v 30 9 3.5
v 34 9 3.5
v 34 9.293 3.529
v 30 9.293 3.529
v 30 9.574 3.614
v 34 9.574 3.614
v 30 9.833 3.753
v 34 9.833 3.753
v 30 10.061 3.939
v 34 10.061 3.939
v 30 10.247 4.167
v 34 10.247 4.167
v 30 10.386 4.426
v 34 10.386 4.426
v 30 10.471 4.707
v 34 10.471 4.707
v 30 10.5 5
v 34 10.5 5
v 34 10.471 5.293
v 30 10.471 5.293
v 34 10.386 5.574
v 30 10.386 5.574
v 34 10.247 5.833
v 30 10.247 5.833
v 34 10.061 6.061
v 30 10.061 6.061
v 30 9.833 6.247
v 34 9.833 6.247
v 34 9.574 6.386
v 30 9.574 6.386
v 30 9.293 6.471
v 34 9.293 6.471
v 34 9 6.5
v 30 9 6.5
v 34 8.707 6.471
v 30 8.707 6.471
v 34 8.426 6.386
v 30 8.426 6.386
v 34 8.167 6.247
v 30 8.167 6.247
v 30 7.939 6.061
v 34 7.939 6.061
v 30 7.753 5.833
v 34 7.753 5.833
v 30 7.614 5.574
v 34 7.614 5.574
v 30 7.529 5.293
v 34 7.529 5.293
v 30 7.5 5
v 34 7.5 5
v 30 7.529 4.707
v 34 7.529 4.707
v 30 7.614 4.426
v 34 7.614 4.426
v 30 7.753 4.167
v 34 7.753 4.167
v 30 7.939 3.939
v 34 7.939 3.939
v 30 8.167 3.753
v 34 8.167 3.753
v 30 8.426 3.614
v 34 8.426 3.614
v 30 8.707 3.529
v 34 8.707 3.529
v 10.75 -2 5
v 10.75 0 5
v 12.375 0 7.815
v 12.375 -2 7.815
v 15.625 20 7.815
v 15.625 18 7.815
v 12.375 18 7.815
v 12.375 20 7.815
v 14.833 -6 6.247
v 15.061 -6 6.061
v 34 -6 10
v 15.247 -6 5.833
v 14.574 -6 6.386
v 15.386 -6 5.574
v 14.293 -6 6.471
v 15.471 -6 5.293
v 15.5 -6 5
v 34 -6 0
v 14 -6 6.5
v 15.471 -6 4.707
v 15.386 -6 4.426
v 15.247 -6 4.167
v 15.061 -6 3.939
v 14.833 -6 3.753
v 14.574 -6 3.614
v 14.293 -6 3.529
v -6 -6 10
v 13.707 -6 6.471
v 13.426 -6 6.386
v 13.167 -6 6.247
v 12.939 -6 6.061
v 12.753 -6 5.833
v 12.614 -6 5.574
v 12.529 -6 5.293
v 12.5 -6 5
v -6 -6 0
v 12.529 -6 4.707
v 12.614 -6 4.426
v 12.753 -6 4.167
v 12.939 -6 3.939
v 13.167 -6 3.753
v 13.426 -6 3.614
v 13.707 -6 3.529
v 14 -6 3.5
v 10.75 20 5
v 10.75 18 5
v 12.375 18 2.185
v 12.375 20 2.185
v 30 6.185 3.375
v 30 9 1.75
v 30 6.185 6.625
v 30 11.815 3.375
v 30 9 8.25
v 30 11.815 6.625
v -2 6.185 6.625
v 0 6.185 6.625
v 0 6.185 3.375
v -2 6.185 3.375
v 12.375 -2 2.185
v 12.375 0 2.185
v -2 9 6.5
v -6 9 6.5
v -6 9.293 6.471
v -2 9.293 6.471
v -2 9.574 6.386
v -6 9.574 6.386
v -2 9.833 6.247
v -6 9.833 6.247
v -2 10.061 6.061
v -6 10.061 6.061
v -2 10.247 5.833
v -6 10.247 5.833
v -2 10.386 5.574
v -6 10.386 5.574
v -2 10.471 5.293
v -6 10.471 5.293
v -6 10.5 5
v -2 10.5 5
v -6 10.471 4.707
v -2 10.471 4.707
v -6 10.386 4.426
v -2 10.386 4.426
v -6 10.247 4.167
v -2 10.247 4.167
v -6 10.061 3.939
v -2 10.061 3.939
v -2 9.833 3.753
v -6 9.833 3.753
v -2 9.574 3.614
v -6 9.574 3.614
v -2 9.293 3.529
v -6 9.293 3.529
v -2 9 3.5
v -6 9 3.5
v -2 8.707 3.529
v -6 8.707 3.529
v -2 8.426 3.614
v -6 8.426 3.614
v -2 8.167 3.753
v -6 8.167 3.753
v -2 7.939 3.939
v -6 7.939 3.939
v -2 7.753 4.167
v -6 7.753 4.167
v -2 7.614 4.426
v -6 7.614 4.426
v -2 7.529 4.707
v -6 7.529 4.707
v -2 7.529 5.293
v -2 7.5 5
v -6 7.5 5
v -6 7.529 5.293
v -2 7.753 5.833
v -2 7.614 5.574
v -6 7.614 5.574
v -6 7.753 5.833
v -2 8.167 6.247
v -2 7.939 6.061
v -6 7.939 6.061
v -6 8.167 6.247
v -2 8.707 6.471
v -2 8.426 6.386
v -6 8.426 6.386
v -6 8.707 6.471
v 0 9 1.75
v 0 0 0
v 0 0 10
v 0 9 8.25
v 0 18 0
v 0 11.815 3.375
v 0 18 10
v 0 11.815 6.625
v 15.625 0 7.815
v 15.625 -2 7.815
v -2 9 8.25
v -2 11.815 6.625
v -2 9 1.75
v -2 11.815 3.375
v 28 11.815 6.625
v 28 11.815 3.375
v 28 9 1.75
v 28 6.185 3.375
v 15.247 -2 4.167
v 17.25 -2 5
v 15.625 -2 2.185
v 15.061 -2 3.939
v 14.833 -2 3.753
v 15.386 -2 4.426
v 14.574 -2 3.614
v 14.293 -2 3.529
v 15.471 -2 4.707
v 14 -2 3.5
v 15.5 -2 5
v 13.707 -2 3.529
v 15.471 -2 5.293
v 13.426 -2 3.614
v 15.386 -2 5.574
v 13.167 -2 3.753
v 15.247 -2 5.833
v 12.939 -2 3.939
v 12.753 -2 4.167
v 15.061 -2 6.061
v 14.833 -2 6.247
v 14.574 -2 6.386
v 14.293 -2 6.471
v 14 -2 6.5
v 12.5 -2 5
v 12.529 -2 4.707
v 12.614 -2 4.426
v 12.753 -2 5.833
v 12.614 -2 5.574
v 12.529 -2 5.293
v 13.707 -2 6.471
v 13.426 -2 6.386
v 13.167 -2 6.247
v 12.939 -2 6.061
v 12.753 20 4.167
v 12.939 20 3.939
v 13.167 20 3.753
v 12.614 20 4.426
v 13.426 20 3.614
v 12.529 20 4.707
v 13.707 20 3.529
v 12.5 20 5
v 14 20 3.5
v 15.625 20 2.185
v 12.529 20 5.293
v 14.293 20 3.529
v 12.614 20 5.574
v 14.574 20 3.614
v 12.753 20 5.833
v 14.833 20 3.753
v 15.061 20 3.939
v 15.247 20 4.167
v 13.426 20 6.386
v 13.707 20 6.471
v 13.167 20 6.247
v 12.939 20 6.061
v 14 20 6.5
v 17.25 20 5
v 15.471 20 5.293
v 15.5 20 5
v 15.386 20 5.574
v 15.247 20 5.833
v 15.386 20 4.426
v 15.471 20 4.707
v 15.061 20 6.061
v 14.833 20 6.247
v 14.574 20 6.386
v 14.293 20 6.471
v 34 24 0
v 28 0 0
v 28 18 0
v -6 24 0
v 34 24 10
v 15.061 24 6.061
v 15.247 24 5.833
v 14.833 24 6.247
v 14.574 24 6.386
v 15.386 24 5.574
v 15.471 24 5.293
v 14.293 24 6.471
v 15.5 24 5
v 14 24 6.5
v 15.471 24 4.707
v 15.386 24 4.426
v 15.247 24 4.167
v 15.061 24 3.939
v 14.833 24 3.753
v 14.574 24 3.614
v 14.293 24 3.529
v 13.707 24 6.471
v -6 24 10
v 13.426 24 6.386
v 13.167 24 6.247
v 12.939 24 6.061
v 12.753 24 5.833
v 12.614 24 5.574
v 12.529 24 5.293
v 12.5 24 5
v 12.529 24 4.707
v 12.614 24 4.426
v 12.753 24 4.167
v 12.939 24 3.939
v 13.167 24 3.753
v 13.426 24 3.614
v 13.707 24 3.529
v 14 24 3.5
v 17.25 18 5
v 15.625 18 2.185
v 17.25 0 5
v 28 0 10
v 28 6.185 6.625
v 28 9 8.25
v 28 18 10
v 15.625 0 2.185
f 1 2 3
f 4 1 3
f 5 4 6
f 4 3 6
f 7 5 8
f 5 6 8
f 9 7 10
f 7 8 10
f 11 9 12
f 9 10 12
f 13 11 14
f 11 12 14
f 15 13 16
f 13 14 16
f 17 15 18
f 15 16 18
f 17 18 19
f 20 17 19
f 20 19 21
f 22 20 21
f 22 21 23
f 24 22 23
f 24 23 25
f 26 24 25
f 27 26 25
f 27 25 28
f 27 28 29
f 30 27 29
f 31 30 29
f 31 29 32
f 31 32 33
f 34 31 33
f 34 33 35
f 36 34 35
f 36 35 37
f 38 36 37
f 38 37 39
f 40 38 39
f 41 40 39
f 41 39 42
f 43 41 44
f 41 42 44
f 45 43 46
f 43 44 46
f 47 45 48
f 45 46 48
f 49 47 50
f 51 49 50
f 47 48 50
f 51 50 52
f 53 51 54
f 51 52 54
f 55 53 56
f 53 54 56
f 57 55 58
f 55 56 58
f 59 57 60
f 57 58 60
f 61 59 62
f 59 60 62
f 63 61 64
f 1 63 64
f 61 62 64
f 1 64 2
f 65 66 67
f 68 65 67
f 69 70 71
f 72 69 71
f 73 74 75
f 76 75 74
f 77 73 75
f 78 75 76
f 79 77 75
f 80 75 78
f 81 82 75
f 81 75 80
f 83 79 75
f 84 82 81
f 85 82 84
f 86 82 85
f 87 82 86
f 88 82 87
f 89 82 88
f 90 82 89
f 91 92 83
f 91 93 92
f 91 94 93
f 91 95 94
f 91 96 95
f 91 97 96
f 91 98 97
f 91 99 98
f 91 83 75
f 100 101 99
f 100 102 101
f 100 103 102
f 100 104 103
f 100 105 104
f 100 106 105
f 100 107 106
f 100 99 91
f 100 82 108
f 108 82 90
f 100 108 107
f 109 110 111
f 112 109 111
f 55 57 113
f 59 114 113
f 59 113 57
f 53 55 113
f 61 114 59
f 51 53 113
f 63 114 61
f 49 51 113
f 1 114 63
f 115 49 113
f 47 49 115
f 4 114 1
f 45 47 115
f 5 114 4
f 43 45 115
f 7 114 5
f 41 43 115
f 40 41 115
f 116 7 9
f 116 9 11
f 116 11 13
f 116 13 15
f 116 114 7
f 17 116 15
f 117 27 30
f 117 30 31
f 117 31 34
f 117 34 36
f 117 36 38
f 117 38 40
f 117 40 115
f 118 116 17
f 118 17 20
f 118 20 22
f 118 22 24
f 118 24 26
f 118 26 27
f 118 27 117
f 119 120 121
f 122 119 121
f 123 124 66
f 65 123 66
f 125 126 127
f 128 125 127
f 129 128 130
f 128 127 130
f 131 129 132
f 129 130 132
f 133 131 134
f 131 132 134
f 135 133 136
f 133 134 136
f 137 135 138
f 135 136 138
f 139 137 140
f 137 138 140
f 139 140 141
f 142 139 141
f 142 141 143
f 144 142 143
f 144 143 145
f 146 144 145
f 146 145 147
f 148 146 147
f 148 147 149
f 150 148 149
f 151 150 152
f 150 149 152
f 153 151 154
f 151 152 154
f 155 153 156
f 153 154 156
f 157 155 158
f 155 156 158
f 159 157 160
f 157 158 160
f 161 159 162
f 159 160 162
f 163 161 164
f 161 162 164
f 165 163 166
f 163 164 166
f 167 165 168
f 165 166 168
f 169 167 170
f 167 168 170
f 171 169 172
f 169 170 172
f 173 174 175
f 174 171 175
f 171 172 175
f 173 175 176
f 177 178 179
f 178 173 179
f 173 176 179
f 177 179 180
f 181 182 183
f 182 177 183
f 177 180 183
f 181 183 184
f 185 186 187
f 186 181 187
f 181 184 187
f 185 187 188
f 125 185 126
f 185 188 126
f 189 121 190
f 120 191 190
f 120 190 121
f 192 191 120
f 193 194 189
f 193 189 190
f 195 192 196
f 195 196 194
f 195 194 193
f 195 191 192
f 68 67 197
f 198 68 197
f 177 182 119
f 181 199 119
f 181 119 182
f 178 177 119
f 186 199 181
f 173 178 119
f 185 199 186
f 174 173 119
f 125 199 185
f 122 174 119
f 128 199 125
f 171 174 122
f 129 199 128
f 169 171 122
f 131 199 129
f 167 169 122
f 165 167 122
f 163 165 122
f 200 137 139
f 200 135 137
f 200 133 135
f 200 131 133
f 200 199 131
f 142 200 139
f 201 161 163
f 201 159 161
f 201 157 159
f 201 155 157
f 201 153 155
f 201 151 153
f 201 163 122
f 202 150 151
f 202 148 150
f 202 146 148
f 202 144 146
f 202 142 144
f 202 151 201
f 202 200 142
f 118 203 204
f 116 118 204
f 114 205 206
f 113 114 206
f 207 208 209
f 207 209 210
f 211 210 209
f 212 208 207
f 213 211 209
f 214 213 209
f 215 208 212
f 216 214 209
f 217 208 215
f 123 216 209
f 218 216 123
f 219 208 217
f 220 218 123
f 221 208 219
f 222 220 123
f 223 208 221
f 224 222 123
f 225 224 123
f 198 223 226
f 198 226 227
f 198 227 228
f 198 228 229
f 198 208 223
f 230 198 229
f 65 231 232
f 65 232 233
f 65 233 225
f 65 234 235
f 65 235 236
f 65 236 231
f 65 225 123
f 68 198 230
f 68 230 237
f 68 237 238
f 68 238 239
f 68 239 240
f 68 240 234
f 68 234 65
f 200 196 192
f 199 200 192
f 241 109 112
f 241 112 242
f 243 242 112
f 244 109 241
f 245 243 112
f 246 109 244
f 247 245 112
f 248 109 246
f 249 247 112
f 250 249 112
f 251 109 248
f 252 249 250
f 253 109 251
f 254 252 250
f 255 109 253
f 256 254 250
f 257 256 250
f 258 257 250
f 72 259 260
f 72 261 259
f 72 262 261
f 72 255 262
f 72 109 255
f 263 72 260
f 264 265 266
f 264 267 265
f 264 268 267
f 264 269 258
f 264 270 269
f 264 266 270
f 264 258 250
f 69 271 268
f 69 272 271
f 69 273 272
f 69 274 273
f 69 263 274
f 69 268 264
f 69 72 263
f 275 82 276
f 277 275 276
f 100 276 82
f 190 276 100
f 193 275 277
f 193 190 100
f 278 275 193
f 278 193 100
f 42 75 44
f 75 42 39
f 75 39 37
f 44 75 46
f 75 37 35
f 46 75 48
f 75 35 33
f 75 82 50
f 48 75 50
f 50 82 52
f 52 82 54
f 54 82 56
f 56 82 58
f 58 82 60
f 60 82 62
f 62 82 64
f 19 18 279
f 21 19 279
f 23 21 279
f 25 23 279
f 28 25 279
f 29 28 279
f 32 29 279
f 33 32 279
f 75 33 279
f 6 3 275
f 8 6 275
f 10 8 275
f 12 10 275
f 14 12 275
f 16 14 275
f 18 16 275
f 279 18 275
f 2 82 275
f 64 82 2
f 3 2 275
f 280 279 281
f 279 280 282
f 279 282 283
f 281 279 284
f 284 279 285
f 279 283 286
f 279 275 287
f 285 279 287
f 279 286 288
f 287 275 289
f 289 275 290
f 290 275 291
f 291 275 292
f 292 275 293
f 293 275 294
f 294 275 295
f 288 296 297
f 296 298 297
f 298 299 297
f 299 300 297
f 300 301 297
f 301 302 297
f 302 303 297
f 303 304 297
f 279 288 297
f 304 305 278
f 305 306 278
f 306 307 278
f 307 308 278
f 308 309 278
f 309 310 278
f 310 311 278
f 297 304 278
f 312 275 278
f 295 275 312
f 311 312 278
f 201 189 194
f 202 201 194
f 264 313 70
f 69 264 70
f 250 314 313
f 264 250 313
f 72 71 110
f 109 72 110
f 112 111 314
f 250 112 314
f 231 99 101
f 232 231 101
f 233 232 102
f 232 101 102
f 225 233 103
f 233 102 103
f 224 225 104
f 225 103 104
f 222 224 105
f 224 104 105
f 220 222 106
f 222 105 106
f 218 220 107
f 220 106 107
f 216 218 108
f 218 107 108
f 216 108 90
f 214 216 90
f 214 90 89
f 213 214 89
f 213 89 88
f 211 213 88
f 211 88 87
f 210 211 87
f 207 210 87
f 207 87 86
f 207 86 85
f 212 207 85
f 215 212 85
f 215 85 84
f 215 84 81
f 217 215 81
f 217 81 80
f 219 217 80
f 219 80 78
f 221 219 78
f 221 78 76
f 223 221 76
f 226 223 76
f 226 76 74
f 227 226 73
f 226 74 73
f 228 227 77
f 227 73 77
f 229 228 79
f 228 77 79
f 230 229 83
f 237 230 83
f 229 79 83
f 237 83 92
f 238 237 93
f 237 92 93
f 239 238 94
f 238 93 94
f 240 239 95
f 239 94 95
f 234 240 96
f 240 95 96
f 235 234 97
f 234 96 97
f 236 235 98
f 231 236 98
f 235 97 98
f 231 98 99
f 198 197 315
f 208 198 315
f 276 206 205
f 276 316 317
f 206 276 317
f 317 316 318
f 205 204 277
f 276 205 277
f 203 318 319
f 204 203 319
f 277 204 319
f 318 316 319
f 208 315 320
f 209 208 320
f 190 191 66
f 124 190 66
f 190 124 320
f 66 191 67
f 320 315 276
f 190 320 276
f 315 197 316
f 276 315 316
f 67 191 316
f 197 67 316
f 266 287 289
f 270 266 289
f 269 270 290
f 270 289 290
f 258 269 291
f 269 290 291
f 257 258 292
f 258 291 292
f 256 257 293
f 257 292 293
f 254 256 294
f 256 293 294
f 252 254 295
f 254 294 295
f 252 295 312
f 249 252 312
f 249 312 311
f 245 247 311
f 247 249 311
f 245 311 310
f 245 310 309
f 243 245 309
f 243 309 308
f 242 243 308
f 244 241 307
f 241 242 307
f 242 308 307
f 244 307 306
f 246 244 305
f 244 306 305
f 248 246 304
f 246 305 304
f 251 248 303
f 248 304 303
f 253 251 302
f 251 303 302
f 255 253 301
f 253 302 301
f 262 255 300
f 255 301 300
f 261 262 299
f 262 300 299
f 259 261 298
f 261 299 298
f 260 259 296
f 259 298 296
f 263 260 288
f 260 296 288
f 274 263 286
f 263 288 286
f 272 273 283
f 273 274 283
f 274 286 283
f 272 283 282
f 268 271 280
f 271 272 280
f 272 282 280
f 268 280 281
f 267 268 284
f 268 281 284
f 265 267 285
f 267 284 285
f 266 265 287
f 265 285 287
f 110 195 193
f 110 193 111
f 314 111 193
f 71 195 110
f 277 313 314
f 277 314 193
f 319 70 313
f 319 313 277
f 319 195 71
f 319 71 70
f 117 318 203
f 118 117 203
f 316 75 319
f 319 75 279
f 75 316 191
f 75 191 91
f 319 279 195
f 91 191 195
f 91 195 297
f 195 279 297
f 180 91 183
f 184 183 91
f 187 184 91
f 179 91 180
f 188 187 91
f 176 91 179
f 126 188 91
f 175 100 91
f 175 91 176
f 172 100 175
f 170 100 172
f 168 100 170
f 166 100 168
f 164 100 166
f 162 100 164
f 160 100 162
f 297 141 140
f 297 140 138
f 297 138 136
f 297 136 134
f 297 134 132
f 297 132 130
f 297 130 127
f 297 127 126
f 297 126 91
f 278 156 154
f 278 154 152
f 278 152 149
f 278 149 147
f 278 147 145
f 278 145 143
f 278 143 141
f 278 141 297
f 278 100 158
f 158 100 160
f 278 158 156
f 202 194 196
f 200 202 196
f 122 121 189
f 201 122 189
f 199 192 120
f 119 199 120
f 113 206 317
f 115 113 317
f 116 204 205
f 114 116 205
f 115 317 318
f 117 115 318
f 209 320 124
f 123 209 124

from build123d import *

# Parameters (mm, degrees)
SKETCH1_W                    = 40
SKETCH1_H                    = 30
BOSS_EXTRUDE1_DEPTH          = 10
SKETCH2_W                    = 28
SKETCH2_H                    = 18
CUT_EXTRUDE1_DEPTH           = 43.801869118
CUT_EXTRUDE2_DEPTH           = 2
CUT_EXTRUDE3_DEPTH           = 2
CUT_EXTRUDE4_DEPTH           = 2
CUT_EXTRUDE5_DEPTH           = 2
F_3_0_3_DIAMETER_HOLE1_D     = 3
F_3_0_3_DIAMETER_HOLE1_DEPTH = 4
F_3_0_3_DIAMETER_HOLE2_D     = 3
F_3_0_3_DIAMETER_HOLE2_DEPTH = 4
F_3_0_3_DIAMETER_HOLE3_D     = 3
F_3_0_3_DIAMETER_HOLE4_D     = 3


with BuildPart() as part:
    # Sketch1 → Boss-Extrude1 (new body)
    with BuildSketch(Plane(origin=(0, 0, 0), x_dir=(-1, 0, 0), z_dir=(0, 0, -1))):
        with Locations((-14, 9)):
            Rectangle(SKETCH1_W, SKETCH1_H)
    extrude(amount=-BOSS_EXTRUDE1_DEPTH)

    # Sketch2 → Cut-Extrude1 (cut, through all)
    with BuildSketch(Plane.XY.offset(10)):
        with Locations((14, 9)):
            Rectangle(SKETCH2_W, SKETCH2_H)
    extrude(amount=-CUT_EXTRUDE1_DEPTH, mode=Mode.SUBTRACT)

    # Sketch3 → Cut-Extrude2 (cut)
    with BuildSketch(Plane(origin=(0, 0, 0), x_dir=(0, 0, -1), z_dir=(1, 0, 0))):
        Polygon((-8.25, 9), (-6.625, 6.185417438), (-3.375, 6.185417438), (-1.75, 9), (-3.375, 11.814582562), (-6.625, 11.814582562), align=None)
    extrude(amount=-CUT_EXTRUDE2_DEPTH, mode=Mode.SUBTRACT)

    # Sketch4 → Cut-Extrude3 (cut)
    with BuildSketch(Plane.XZ.offset(-18)):
        Polygon((17.25, 5), (15.625, 7.814582562), (12.375, 7.814582562), (10.75, 5), (12.375, 2.185417438), (15.625, 2.185417438), align=None)
    extrude(amount=-CUT_EXTRUDE3_DEPTH, mode=Mode.SUBTRACT)

    # Sketch5 → Cut-Extrude4 (cut)
    with BuildSketch(Plane.ZY.offset(-28)):
        Polygon((1.75, 9), (3.375, 6.185417438), (6.625, 6.185417438), (8.25, 9), (6.625, 11.814582562), (3.375, 11.814582562), align=None)
    extrude(amount=-CUT_EXTRUDE4_DEPTH, mode=Mode.SUBTRACT)

    # Sketch6 → Cut-Extrude5 (cut)
    with BuildSketch(Plane(origin=(0, 0, 0), x_dir=(-1, 0, 0), z_dir=(0, 1, 0))):
        Polygon((-17.25, 5), (-15.625, 2.185417438), (-12.375, 2.185417438), (-10.75, 5), (-12.375, 7.814582562), (-15.625, 7.814582562), align=None)
    extrude(amount=-CUT_EXTRUDE5_DEPTH, mode=Mode.SUBTRACT)

    # Ø3.0 (3) Diameter Hole1
    with Locations(Plane(origin=(-2, 0, 0), x_dir=(0, 0, -1), z_dir=(1, 0, 0))):
        with Locations((-5, 9)):
            Hole(F_3_0_3_DIAMETER_HOLE1_D / 2, depth=F_3_0_3_DIAMETER_HOLE1_DEPTH)

    # Ø3.0 (3) Diameter Hole2
    with Locations(Plane(origin=(0, 20, 0), x_dir=(-1, 0, 0), z_dir=(0, -1, 0))):
        with Locations((-14, -5)):
            Hole(F_3_0_3_DIAMETER_HOLE2_D / 2, depth=F_3_0_3_DIAMETER_HOLE2_DEPTH)

    # Ø3.0 (3) Diameter Hole3 (through all)
    with Locations(Plane.ZY.offset(-30)):
        with Locations((5, 9)):
            Hole(F_3_0_3_DIAMETER_HOLE3_D / 2)

    # Ø3.0 (3) Diameter Hole4 (through all)
    with Locations(Plane(origin=(0, -2, 0), x_dir=(1, 0, 0), z_dir=(0, 1, 0))):
        with Locations((14, -5)):
            Hole(F_3_0_3_DIAMETER_HOLE4_D / 2)


solid = part.part
